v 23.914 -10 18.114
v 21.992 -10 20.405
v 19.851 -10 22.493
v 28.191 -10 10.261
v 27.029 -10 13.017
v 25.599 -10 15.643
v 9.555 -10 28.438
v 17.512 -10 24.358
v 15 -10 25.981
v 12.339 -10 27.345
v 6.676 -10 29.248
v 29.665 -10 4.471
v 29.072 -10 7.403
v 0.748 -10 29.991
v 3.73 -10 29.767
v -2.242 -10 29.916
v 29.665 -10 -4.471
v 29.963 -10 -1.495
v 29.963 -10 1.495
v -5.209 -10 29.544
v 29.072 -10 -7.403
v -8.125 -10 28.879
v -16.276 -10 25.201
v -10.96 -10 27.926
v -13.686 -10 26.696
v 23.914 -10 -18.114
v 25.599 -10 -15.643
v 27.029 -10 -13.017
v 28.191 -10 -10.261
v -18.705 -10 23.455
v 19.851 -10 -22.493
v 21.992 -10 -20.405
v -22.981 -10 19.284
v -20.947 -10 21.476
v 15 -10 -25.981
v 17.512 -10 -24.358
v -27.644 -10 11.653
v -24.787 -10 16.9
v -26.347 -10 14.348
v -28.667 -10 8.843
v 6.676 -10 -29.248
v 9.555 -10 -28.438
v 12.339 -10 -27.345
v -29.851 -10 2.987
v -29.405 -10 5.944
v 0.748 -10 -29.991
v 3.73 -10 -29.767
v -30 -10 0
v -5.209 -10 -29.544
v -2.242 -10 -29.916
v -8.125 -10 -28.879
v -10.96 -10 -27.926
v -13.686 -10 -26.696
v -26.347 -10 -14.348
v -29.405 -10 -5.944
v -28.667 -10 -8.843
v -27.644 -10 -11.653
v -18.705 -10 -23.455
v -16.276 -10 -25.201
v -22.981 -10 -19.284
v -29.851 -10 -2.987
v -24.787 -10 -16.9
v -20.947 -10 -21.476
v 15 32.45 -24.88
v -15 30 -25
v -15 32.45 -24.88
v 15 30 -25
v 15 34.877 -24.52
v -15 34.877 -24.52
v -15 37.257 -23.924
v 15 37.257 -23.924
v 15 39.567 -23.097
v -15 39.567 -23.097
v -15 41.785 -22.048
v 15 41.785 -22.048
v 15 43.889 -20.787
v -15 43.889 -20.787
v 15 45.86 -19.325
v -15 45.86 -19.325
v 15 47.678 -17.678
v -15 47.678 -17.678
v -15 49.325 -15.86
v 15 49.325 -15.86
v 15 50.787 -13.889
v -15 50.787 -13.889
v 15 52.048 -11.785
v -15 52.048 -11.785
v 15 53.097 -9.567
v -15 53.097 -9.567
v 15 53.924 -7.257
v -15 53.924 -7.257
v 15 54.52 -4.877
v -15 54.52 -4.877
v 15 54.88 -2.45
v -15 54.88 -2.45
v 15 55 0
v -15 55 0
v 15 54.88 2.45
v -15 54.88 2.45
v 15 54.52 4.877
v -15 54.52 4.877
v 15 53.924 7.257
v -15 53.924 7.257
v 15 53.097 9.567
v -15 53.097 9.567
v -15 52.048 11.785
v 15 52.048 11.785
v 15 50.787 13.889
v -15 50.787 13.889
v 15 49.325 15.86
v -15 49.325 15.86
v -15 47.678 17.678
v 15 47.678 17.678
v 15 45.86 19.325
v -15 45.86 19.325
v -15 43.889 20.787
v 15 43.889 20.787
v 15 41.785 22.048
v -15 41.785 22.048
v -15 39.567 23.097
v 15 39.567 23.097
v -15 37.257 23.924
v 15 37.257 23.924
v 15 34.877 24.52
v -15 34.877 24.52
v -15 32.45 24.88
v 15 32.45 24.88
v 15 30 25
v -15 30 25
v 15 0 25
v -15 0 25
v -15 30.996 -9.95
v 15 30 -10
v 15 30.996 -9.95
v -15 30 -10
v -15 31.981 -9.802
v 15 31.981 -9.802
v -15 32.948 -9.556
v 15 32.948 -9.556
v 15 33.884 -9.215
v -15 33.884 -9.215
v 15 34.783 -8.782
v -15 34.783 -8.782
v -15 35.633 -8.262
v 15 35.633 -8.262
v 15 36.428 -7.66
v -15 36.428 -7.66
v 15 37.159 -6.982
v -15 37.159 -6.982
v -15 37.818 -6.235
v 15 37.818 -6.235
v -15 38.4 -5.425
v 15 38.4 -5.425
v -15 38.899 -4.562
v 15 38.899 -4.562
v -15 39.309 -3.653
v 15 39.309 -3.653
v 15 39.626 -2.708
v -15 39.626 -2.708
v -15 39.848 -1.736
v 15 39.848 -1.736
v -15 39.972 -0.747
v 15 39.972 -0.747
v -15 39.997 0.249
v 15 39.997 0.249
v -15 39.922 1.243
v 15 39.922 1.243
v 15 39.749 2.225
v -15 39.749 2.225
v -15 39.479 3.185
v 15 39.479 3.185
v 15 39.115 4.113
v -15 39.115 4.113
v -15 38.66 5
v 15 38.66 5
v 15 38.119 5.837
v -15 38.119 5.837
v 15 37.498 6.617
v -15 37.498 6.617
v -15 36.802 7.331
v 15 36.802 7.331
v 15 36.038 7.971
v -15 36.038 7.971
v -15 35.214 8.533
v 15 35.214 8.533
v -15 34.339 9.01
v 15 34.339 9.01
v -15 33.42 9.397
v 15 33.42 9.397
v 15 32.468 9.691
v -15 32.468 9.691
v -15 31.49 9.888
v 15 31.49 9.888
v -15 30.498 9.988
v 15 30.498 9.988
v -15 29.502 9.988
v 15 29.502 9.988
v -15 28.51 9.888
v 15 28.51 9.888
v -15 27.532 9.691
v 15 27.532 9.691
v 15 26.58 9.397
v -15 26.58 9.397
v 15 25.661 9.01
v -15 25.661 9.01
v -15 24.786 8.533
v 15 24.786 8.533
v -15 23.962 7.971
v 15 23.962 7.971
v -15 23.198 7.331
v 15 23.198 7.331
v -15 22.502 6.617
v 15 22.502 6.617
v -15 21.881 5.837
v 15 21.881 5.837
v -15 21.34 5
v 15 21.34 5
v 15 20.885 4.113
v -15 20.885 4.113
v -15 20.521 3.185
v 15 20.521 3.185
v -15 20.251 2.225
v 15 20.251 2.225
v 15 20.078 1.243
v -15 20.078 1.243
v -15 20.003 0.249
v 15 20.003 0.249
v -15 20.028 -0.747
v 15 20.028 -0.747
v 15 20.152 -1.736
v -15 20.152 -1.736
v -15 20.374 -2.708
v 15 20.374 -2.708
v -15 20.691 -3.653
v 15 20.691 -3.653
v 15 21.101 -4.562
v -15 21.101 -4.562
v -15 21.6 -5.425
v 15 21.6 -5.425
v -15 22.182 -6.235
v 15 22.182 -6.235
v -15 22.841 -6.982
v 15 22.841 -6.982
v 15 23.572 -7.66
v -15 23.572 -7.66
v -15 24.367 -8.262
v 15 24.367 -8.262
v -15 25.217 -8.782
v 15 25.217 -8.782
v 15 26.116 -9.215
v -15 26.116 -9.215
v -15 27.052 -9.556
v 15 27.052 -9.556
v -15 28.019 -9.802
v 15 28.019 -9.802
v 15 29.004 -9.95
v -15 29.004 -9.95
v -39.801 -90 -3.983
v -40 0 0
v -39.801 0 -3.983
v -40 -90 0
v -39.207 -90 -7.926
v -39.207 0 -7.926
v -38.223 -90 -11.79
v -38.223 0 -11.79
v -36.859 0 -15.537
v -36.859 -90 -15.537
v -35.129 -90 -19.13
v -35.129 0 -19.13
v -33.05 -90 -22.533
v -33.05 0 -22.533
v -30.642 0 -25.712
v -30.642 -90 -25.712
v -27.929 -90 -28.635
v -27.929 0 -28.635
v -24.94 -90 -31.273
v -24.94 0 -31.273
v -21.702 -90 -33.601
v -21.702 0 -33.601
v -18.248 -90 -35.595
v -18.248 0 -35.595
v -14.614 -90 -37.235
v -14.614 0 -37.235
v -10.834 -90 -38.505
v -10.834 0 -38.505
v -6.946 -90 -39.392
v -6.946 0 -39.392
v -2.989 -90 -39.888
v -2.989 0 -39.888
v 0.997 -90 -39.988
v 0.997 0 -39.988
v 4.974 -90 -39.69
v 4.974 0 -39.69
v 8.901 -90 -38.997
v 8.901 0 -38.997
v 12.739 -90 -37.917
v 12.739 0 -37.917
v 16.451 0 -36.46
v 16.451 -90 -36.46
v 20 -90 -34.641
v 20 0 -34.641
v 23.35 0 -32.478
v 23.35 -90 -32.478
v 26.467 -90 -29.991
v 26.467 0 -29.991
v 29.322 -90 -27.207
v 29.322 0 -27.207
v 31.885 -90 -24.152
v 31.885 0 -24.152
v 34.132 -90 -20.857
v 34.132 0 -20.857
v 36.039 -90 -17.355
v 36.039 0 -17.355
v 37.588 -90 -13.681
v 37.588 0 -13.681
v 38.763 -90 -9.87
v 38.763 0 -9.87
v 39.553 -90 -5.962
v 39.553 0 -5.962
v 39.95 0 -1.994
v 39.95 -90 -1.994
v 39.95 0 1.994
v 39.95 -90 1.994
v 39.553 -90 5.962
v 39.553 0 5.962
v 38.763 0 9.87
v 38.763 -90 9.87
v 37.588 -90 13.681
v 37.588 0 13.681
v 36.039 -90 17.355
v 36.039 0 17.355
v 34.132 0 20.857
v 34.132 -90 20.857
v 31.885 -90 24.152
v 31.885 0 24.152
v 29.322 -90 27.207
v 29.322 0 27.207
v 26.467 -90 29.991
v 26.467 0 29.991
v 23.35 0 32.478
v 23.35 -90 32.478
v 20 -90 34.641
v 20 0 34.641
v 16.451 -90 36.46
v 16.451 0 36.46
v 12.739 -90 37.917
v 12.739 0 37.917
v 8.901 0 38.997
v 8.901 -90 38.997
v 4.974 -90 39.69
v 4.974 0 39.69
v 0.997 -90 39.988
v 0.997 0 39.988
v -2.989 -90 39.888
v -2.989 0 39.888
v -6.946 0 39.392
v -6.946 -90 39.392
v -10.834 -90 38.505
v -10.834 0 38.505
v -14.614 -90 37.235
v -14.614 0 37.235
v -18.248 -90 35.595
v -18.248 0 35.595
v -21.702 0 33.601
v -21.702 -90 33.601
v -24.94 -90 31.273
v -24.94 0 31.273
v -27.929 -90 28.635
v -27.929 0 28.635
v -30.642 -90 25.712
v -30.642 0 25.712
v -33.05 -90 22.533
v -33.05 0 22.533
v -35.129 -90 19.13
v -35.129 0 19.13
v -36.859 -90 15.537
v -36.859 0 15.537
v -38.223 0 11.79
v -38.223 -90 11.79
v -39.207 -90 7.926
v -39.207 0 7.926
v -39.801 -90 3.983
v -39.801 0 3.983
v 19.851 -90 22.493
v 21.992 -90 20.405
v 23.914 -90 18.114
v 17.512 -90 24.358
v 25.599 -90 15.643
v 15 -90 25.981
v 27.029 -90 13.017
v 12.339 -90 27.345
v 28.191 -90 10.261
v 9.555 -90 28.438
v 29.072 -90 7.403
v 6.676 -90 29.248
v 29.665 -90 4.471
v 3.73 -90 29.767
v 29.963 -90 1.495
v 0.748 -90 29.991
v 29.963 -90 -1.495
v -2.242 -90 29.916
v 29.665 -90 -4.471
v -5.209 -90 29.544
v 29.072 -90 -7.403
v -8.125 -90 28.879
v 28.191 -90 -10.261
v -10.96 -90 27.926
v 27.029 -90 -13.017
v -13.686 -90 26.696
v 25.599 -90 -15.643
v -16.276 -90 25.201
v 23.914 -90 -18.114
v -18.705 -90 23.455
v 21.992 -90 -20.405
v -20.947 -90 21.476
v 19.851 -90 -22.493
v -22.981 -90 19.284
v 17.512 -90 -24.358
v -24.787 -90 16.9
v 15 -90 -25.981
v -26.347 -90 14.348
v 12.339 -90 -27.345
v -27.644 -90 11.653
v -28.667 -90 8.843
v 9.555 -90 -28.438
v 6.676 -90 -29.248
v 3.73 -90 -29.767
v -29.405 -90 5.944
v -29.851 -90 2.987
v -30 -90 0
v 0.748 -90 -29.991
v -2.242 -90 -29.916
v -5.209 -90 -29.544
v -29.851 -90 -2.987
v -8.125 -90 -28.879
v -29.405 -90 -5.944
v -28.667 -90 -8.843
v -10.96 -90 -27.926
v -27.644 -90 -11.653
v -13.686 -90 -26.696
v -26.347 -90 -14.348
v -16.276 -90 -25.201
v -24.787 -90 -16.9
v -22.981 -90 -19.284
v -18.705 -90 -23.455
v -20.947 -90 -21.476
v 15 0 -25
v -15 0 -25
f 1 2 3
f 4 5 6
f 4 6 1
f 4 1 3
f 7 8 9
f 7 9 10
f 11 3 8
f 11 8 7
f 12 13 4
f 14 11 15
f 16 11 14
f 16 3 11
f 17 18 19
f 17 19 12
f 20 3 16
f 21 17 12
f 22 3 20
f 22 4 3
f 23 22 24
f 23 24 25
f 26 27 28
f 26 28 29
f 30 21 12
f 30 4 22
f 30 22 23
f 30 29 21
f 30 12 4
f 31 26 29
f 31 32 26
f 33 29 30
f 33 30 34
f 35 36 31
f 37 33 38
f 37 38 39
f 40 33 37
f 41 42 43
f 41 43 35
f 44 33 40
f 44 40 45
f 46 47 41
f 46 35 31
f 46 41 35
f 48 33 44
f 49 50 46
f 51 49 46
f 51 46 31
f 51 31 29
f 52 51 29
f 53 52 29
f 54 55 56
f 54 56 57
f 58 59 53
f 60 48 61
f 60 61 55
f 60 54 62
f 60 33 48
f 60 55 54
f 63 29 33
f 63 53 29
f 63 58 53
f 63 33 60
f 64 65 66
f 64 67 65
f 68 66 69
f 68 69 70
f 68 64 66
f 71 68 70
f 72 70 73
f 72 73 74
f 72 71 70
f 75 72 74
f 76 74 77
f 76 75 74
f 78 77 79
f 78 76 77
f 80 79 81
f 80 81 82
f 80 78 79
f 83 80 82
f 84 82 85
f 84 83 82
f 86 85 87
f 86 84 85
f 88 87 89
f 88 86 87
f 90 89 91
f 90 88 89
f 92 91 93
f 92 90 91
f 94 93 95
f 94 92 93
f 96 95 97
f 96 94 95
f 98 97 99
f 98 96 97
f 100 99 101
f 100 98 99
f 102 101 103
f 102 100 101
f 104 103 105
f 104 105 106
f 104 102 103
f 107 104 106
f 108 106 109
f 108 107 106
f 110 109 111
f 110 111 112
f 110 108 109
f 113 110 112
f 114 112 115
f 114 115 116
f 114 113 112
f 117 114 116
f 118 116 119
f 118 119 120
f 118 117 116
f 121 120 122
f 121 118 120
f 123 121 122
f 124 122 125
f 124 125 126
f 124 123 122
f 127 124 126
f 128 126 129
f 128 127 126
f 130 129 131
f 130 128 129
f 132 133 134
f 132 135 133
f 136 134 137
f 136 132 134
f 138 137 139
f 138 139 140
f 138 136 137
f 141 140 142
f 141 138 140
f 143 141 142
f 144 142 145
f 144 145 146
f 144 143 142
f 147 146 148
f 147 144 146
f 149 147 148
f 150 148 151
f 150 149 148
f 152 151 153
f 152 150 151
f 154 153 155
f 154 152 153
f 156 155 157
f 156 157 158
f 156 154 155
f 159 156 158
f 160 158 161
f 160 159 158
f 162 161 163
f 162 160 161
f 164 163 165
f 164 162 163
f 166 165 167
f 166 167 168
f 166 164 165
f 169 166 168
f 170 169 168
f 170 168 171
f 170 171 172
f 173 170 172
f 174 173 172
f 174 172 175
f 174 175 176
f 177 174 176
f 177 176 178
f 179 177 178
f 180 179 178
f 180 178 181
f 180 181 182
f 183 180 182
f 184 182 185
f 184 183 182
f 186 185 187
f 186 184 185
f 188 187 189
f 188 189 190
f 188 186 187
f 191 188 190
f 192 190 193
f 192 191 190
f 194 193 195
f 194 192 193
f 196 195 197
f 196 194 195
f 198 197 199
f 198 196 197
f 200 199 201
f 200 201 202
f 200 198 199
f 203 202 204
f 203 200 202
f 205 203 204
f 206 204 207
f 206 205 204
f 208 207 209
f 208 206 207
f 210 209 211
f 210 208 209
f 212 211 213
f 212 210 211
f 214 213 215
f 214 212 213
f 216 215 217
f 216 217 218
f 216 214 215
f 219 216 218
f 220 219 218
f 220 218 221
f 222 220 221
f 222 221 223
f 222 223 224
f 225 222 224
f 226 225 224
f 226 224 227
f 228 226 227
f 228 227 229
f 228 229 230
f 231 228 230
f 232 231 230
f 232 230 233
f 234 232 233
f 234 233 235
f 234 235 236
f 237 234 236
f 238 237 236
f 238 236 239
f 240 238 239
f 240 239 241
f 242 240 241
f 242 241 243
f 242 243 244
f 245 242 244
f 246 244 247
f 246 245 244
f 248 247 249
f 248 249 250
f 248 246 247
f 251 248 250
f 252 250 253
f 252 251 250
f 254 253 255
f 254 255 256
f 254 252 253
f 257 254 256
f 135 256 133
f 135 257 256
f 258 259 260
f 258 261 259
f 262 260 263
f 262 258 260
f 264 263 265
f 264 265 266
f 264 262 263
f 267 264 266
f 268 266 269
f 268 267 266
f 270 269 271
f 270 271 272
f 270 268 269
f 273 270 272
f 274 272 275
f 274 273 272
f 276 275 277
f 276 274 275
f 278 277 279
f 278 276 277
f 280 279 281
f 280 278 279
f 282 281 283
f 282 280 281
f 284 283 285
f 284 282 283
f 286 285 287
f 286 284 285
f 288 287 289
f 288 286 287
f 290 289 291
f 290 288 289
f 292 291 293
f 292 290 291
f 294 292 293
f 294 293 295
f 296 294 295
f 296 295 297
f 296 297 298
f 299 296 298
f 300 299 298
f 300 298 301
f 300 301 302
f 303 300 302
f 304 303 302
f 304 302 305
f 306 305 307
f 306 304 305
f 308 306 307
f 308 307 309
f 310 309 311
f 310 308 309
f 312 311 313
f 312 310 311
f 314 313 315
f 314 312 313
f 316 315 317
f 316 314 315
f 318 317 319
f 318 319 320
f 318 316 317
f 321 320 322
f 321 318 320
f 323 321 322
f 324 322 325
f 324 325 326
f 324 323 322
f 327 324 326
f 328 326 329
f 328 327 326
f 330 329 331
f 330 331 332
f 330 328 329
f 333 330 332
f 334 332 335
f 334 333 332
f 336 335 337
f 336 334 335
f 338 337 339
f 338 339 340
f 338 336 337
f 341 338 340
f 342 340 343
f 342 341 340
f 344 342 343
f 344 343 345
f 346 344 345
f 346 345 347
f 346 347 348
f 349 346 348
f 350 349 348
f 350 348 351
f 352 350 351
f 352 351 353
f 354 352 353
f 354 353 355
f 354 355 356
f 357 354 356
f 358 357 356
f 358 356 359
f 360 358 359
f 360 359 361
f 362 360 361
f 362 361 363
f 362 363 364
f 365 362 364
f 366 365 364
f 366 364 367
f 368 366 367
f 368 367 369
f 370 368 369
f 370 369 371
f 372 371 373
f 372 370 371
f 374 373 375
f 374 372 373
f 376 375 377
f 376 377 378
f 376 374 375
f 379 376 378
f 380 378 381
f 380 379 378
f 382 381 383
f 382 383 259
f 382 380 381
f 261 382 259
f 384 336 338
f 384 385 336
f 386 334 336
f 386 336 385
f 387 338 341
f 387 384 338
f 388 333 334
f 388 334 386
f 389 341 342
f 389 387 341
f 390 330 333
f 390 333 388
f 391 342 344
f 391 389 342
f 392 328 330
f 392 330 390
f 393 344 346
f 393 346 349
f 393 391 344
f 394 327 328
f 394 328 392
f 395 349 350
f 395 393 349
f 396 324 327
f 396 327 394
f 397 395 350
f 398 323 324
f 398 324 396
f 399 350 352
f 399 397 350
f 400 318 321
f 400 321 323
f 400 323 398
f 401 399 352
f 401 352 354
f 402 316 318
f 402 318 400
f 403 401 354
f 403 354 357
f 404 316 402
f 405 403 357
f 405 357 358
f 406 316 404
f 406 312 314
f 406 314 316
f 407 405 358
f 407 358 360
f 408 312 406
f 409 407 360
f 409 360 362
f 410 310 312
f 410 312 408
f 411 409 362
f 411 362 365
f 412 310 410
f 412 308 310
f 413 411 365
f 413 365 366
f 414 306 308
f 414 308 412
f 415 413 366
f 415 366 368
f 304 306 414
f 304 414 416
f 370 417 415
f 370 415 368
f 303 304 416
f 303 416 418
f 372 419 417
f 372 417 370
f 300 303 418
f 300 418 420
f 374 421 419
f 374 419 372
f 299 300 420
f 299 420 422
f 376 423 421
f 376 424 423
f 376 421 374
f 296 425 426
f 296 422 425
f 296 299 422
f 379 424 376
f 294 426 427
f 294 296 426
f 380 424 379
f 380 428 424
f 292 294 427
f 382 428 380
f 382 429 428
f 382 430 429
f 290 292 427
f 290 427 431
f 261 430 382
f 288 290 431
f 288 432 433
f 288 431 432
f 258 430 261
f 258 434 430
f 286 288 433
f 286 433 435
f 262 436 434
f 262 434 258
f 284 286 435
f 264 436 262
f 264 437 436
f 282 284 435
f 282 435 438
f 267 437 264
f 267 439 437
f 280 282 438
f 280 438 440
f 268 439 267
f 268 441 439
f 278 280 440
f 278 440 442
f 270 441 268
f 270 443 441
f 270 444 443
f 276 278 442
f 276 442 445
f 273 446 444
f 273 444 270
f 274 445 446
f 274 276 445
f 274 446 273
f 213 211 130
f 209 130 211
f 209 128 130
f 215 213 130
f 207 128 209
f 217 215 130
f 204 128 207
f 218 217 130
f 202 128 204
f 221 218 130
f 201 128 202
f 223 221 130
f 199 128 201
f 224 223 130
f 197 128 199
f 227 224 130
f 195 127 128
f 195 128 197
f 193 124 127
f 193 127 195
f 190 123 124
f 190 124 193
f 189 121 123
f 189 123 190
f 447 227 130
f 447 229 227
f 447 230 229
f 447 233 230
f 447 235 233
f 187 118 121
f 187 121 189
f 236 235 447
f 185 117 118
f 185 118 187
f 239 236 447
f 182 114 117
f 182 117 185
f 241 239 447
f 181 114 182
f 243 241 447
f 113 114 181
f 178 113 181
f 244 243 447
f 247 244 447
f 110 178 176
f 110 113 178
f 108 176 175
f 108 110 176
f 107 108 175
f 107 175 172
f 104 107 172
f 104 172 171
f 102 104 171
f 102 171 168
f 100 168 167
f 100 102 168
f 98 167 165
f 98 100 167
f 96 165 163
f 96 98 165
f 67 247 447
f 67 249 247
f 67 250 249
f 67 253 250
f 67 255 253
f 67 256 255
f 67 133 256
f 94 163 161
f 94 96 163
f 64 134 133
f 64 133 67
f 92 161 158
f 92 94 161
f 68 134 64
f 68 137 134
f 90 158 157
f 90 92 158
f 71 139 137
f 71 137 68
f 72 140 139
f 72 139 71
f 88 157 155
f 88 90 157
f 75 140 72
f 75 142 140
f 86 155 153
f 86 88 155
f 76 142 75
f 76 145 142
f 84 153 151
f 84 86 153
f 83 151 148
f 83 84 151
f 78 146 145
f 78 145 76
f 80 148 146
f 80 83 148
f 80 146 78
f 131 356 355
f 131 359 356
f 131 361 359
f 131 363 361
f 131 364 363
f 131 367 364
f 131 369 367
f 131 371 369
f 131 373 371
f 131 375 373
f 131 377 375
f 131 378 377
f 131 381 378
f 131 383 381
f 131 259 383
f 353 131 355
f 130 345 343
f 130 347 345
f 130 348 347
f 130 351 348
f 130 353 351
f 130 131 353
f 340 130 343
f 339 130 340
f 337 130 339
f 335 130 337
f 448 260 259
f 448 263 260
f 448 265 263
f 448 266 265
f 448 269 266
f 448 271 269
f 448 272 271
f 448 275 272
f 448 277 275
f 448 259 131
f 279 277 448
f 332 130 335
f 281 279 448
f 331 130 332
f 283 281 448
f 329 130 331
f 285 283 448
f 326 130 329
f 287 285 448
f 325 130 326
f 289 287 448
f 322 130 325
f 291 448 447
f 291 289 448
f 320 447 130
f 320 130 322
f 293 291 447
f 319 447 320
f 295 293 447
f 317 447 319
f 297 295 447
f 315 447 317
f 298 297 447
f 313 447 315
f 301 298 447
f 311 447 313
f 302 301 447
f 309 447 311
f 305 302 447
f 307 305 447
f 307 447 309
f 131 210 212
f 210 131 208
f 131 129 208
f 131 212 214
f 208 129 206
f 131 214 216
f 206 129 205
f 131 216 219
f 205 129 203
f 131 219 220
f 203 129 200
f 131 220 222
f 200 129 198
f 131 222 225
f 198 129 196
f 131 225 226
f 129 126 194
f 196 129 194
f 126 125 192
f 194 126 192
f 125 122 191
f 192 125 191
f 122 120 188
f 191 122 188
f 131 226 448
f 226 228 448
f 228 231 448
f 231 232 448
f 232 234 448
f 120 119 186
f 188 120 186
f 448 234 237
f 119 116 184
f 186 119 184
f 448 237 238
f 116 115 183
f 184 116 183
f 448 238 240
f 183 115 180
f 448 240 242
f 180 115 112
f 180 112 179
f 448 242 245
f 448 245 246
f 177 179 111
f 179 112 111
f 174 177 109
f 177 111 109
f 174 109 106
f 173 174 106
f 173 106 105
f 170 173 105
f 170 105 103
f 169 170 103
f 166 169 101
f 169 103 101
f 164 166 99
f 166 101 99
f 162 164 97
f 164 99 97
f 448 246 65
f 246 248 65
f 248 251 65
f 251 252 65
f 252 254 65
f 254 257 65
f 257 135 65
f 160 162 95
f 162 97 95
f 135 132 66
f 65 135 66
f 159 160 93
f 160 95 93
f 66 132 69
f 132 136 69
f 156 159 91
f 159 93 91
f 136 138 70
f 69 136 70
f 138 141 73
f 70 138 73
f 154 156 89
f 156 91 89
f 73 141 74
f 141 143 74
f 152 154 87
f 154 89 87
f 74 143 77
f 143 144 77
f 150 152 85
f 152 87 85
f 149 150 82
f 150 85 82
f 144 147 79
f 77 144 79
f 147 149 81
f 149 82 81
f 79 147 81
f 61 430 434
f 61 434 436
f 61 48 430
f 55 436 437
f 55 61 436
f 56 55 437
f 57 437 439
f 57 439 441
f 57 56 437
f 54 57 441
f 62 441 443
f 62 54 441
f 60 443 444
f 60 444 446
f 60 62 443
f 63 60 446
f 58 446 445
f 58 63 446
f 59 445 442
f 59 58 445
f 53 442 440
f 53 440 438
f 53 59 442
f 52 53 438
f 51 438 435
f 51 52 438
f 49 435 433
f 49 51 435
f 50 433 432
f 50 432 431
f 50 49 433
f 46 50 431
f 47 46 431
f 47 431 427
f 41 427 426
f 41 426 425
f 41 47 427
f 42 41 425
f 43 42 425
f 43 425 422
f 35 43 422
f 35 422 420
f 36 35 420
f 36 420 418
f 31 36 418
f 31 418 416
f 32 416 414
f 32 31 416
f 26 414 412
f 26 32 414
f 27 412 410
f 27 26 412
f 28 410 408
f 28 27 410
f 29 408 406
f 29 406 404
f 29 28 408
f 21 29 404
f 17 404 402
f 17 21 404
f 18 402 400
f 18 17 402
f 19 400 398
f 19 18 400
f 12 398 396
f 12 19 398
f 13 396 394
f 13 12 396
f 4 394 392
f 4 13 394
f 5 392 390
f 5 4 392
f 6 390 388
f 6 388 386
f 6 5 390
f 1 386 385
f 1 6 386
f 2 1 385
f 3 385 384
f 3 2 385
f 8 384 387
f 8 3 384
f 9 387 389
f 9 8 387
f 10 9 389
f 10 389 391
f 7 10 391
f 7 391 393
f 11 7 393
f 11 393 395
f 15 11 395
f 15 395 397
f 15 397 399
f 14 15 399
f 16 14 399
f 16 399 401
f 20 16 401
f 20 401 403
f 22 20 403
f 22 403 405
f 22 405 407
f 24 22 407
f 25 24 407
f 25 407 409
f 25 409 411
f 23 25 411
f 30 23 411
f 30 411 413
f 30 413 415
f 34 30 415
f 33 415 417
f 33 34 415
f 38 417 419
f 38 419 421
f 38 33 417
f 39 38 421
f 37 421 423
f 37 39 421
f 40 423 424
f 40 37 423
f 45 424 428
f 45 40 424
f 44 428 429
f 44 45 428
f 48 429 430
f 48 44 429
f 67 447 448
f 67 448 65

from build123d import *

# Parameters (mm, degrees)
SKETCH2_R           = 10
BOSS_EXTRUDE1_DEPTH = 15


with BuildPart() as part:
    # Sketch1 → Revolve1 (revolve)
    with BuildSketch(Plane.XY, mode=Mode.PRIVATE) as revolve1_sk:
        Polygon((0, 0), (40, 0), (40, -90), (30, -90), (30, -10), (0, -10), align=None)
    revolve(revolve1_sk.sketch.rotate(Axis((0, -10, 0), (0, -1, 0)), 180), axis=Axis((0, -10, 0), (0, -1, 0)))

    # Sketch2 → Boss-Extrude1 (add, symmetric)
    with BuildSketch(Plane(origin=(0, 0, 0), x_dir=(0, 0, -1), z_dir=(1, 0, 0))):
        with BuildLine():
            Line((-25, 30), (-25, 0))
            Line((-25, 0), (25, 0))
            Line((25, 0), (25, 30))
            ThreePointArc((25, 30), (0, 55), (-25, 30))
        make_face()
        with Locations((0, 30)):
            Circle(SKETCH2_R, mode=Mode.SUBTRACT)
    extrude(amount=BOSS_EXTRUDE1_DEPTH, both=True)


solid = part.part
